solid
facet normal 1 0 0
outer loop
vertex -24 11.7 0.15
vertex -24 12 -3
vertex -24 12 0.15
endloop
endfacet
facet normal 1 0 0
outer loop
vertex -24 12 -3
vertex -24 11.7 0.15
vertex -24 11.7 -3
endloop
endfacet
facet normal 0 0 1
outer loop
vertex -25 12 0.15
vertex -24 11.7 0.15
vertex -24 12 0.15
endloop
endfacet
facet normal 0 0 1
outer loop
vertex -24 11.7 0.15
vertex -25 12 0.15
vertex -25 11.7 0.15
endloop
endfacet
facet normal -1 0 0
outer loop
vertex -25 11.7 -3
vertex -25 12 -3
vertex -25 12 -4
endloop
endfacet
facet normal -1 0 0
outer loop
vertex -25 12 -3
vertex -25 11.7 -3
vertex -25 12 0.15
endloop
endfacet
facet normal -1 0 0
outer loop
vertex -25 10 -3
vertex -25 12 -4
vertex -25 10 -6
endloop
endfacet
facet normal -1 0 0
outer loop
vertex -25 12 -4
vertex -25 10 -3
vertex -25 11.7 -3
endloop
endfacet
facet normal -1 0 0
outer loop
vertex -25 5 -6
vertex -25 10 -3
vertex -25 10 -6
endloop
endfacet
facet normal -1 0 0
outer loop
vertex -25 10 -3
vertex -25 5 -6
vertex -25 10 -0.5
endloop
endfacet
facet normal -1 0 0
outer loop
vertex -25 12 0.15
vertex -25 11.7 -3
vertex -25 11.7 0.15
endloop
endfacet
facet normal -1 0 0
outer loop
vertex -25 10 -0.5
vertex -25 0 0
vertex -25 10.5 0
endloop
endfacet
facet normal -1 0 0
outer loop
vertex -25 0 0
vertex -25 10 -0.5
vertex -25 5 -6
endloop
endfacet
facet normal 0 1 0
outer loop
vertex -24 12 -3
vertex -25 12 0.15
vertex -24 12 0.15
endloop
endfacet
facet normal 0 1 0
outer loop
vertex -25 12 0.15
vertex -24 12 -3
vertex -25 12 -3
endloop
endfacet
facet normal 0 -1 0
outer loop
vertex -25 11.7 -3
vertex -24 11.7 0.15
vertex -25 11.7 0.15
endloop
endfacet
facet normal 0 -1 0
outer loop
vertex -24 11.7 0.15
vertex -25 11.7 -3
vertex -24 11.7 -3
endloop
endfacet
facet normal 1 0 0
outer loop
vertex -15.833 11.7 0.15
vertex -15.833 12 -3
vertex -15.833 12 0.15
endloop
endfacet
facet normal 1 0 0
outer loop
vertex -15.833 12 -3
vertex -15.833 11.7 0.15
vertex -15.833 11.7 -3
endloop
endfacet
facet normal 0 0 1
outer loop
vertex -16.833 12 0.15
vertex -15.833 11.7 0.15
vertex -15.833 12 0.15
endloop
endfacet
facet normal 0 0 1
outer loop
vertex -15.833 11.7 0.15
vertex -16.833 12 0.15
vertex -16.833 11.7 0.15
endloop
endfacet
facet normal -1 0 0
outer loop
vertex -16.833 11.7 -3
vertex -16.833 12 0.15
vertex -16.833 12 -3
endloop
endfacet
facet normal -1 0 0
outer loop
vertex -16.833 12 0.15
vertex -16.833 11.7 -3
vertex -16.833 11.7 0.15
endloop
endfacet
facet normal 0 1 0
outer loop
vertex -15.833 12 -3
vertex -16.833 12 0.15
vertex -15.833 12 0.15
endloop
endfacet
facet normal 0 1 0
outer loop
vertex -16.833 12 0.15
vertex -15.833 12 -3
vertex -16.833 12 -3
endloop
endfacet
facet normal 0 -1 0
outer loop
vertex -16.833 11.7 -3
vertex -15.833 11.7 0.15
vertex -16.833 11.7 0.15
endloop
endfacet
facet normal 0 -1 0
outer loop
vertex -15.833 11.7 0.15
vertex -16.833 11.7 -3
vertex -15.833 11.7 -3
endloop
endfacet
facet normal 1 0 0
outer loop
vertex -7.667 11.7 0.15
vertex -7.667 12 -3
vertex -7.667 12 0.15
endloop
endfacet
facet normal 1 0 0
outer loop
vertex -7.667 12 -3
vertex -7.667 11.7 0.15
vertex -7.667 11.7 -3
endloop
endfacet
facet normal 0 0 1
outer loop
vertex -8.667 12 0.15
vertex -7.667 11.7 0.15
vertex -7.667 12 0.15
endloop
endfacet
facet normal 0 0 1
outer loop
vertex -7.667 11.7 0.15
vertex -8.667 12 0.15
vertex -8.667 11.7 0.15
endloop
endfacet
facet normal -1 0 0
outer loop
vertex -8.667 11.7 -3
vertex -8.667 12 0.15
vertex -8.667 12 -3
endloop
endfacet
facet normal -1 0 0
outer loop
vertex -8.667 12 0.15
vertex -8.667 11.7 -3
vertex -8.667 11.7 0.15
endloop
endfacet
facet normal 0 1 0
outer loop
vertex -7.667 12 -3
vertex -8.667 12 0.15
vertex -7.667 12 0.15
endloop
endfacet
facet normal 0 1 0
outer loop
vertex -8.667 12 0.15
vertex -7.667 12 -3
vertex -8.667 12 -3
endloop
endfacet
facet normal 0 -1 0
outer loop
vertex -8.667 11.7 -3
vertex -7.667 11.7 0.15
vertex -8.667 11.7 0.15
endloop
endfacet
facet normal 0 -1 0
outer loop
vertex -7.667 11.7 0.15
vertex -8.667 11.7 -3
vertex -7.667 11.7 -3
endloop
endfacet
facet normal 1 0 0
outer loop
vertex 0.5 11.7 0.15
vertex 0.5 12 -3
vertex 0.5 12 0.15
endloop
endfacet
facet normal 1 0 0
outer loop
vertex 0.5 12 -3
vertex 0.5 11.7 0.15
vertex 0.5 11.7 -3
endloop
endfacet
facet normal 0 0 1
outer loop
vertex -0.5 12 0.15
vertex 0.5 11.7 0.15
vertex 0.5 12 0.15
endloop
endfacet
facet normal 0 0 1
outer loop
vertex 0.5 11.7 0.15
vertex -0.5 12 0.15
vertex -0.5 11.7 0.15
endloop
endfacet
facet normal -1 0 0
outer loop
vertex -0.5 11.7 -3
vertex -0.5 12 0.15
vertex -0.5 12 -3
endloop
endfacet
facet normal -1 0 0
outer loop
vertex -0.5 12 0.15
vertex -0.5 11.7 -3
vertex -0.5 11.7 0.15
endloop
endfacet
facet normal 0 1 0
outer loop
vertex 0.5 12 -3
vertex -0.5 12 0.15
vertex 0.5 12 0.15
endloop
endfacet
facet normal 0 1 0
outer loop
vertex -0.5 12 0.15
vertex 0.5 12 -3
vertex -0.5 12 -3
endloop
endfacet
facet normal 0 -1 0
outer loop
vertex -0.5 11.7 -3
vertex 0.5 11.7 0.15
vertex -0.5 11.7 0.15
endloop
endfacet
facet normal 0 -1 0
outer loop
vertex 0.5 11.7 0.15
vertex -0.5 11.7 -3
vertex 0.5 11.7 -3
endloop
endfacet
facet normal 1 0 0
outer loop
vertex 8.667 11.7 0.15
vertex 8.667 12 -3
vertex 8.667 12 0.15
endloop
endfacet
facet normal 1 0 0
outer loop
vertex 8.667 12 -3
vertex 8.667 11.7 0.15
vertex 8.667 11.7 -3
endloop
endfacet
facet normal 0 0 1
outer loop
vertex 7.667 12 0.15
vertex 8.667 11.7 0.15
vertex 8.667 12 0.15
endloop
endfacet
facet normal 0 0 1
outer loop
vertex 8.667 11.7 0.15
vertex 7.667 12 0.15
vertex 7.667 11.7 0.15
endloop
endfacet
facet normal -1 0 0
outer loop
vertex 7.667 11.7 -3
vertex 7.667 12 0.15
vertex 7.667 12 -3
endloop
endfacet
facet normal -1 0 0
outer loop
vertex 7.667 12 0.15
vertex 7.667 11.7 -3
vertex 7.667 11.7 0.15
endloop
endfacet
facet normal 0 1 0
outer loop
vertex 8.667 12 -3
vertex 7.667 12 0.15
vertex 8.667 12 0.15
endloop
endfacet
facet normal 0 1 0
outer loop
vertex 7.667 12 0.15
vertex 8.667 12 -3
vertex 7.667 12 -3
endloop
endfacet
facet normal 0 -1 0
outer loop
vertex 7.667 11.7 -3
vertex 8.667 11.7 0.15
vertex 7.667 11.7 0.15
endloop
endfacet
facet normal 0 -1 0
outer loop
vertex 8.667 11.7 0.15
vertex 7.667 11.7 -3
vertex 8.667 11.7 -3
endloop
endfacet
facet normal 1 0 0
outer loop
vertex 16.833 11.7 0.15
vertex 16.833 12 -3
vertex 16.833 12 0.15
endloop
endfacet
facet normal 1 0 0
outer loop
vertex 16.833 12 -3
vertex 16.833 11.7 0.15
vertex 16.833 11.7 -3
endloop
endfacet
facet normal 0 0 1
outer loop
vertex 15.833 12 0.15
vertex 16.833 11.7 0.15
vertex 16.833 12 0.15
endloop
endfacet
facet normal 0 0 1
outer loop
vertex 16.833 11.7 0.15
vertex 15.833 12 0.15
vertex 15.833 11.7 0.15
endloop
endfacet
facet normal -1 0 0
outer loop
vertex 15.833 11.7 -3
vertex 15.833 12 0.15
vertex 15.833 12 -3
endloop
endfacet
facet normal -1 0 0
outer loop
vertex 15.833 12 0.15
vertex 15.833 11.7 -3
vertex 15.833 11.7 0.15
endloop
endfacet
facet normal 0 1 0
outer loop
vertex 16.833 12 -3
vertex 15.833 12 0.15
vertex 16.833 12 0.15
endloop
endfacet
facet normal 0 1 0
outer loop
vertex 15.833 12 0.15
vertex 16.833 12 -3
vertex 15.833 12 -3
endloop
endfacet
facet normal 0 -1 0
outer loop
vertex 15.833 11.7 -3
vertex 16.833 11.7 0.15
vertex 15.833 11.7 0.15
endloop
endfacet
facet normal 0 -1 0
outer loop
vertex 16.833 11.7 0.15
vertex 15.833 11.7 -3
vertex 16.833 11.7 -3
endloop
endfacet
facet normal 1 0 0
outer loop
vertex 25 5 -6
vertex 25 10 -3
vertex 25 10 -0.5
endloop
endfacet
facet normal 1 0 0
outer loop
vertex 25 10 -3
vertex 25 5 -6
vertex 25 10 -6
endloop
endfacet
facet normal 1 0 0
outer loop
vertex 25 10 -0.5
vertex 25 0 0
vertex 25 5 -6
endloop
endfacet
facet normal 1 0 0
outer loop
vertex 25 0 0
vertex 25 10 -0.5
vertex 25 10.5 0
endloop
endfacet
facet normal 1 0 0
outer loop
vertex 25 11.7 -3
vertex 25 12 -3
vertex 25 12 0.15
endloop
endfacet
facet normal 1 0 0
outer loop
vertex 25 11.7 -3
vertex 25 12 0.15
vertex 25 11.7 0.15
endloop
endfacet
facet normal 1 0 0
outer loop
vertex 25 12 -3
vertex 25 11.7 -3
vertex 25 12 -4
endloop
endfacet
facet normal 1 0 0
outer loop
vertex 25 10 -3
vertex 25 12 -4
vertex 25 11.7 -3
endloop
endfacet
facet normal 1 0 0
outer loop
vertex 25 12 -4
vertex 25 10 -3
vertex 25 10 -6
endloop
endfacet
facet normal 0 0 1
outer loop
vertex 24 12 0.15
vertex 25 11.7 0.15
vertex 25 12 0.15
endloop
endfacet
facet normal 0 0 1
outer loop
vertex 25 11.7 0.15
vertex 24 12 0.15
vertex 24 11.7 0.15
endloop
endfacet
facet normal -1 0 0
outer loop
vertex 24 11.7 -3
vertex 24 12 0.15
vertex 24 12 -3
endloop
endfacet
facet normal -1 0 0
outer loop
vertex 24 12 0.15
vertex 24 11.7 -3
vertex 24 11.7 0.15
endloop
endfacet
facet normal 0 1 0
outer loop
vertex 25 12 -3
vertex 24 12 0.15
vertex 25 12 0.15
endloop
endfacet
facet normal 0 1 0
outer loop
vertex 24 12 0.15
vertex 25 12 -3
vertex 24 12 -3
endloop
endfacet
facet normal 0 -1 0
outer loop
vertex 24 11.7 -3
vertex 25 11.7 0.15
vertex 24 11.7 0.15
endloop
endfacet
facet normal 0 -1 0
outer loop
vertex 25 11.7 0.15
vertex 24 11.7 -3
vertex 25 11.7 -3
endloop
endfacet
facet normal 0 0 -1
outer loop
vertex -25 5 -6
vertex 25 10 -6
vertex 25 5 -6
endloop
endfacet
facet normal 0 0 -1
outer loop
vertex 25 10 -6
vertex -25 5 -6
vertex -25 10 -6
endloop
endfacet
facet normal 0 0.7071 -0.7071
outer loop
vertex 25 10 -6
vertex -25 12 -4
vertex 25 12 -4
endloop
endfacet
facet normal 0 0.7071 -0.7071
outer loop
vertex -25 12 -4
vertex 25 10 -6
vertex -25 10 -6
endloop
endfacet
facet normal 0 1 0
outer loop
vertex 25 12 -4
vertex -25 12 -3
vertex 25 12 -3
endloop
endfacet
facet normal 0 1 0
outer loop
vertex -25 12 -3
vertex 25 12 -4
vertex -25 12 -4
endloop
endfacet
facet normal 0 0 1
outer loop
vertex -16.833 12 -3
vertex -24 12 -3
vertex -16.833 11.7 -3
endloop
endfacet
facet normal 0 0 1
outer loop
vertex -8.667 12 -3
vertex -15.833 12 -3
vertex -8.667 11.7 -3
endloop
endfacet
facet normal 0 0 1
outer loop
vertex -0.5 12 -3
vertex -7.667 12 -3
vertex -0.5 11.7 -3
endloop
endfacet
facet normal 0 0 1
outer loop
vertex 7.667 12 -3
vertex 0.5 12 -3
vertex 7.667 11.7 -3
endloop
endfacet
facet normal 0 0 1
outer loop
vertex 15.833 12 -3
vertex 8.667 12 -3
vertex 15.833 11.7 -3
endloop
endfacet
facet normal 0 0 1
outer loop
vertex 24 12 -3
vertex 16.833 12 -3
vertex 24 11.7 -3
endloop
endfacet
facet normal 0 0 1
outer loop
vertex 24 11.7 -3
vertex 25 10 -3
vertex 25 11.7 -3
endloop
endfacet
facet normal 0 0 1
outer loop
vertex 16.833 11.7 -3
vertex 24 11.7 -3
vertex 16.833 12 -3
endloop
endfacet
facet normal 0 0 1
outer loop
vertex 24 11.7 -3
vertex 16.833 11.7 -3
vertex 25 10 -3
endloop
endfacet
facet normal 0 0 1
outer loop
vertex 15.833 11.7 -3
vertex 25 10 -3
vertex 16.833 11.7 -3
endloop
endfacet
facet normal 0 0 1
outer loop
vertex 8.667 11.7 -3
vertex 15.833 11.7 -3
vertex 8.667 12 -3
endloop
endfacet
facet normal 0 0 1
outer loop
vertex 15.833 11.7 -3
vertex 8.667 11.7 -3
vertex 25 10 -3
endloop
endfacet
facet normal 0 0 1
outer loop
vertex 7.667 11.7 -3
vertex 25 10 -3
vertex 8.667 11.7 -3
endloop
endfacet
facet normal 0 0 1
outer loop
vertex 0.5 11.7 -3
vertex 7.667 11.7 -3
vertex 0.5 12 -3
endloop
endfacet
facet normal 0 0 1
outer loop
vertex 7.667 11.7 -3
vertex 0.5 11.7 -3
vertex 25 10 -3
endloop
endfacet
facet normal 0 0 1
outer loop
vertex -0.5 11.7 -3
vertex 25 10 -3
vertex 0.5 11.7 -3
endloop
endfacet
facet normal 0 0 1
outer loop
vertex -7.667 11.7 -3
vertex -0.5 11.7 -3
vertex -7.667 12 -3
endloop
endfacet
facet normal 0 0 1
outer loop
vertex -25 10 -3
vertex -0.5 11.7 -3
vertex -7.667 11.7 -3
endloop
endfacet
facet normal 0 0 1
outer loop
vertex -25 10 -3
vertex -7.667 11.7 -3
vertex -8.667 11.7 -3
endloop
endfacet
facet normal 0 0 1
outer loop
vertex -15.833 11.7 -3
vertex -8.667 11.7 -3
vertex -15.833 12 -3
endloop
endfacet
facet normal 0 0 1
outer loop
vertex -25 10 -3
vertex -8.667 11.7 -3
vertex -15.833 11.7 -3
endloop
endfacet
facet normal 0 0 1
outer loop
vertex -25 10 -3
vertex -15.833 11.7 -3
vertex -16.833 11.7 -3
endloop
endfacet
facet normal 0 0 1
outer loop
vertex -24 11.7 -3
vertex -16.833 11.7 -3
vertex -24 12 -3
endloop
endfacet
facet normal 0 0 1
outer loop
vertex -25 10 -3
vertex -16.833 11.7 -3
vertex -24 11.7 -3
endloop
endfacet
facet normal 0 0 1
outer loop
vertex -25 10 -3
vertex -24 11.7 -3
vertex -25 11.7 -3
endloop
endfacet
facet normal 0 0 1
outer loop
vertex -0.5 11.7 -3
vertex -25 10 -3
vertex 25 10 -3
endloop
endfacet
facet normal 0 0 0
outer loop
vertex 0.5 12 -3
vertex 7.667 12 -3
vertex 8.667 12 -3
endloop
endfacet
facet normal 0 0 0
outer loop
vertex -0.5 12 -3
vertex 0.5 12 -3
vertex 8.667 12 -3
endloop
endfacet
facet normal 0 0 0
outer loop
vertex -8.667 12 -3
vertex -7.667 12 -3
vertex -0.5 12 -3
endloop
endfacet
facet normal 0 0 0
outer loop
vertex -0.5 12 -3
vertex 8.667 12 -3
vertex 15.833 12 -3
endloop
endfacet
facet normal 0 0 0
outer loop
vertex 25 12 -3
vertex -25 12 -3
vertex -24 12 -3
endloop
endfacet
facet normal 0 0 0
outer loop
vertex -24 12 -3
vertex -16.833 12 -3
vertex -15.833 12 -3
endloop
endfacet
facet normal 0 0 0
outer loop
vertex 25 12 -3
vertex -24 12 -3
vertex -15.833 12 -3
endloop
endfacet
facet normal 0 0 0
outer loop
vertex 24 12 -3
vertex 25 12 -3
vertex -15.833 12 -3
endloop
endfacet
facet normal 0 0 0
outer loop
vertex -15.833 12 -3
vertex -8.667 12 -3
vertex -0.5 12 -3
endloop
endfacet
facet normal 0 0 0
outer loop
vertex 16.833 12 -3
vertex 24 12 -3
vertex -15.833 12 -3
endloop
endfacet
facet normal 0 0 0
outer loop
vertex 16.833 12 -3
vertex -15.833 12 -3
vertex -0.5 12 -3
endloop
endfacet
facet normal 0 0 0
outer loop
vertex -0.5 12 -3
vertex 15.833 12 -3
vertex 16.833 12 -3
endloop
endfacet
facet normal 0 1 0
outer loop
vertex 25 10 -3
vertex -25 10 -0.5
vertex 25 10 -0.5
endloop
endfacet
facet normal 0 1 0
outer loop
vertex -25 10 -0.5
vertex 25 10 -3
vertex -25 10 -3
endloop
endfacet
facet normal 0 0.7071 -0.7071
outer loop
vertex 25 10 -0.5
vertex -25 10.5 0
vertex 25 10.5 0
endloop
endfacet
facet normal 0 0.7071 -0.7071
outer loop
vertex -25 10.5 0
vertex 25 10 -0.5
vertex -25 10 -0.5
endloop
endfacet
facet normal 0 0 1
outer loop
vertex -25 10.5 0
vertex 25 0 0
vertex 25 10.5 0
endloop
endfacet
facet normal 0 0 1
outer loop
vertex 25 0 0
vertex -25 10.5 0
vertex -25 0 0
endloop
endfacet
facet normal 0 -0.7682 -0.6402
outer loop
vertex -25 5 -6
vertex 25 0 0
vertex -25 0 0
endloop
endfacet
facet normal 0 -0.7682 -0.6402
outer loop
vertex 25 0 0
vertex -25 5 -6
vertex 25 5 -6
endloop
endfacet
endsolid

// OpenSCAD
module hook(
    hook_w = 50,
	hook_h = 6,
	gap = 0.3,
	ground_len = 10,
	hook_inner_deep = 2,
	hook_inner_h = 3,
	wall = 1.6
){

	outer_h = hook_h - hook_inner_h;
	support_w = 0.3;
	support_l = 1;

    union(){
        rotate(90,[0,1,0]){
            linear_extrude(hook_w, center=true){
                polygon([
                    [0,0],
                    [0,ground_len+wall/2-gap],
                    
                    [wall/2-gap,ground_len],
                    
                    [hook_inner_h,ground_len],
                    
                    [hook_inner_h,ground_len+hook_inner_deep],
                    
                    [hook_inner_h+outer_h/3, ground_len+hook_inner_deep],
                    
                    [hook_h,ground_len+hook_inner_deep-2*outer_h/3],
                    
                    [hook_h,ground_len/2],
                ]);
            }
        }
        translate([0,ground_len+hook_inner_deep-support_w/2,-(hook_inner_h+gap)/2+gap/2]){
			union(){
				
				for(i=[-3:3]){
					translate([i/3*(hook_w/2-support_l/2),0,0]){
						cube([support_l,support_w,hook_inner_h+gap],center=true);
					}
				}
			}            
        }
    }
    

}

hook();
